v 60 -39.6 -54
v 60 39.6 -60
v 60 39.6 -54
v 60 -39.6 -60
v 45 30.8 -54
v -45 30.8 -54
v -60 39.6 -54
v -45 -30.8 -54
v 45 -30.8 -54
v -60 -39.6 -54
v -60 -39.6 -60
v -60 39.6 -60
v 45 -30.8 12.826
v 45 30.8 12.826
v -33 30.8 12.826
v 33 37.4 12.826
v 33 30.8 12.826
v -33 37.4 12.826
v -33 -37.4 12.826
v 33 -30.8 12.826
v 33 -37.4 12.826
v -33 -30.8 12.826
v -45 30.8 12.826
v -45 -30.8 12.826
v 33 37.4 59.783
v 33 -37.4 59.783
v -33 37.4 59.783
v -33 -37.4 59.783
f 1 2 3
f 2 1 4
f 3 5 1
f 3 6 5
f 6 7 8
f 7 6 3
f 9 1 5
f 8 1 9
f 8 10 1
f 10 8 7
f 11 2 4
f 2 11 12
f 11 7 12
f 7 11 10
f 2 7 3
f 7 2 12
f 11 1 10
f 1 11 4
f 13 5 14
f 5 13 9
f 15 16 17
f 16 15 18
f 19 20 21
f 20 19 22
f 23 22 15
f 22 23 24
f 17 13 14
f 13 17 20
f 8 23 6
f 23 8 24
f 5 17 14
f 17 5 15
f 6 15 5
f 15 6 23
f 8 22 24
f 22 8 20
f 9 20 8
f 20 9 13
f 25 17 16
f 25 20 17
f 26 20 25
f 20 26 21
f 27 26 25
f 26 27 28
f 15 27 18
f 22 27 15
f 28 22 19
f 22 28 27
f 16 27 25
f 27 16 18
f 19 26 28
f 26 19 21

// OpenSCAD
// A mains transformer, 120.0mm x 88.0mm x 120.0mm
// One connected solid (union with intentional overlaps)

overall_width_mm  = 120; //[60:240:1]
overall_depth_mm  = 88;  //[44:176:1]
overall_height_mm = 120; //[60:240:1]

foot_thickness_mm = 6;   //[3:12:1]
foot_width_ratio  = 1;   //[0.85:1.1:0.01]
foot_depth_ratio  = 0.9; //[0.7:1:0.01]

lamination_width_ratio  = 0.75; //[0.55:0.9:0.01]
lamination_depth_ratio  = 0.7;  //[0.5:0.85:0.01]
lamination_height_ratio = 0.65; //[0.45:0.8:0.01]

bobbin_width_ratio  = 0.55; //[0.35:0.75:0.01]
bobbin_depth_ratio  = 0.85; //[0.6:1:0.01]
bobbin_height_ratio = 0.45; //[0.25:0.65:0.01]

connect_overlap_mm = 1; //[0.5:2:0.1]

// Derived dimensions
foot_w = overall_width_mm  * foot_width_ratio;
foot_d = overall_depth_mm  * foot_depth_ratio;
foot_h = foot_thickness_mm;

lam_w = overall_width_mm   * lamination_width_ratio;
lam_d = overall_depth_mm   * lamination_depth_ratio;
lam_h = overall_height_mm  * lamination_height_ratio;

bob_w = overall_width_mm   * bobbin_width_ratio;
bob_d = overall_depth_mm   * bobbin_depth_ratio;
bob_h = overall_height_mm  * bobbin_height_ratio;

// Z placement (bottom of transformer at z = -overall_height_mm/2)
z_bottom = -overall_height_mm/2;

// Ensure the stack fits within overall height by scaling the upper blocks if needed
stack_h = foot_h + lam_h + bob_h;
scale_z = (stack_h > overall_height_mm) ? (overall_height_mm / stack_h) : 1;

lam_h_s = lam_h * scale_z;
bob_h_s = bob_h * scale_z;

// Clamp overlap to avoid inverted placement
ov = min(connect_overlap_mm, min(foot_h, min(lam_h_s, bob_h_s)) * 0.45);

// Component modules
module mounting_foot_plate() {
  translate([0, 0, z_bottom + foot_h/2])
    cube([foot_w, foot_d, foot_h], center=true);
}

module lamination_core_block() {
  // Sits on top of foot with slight overlap into foot
  translate([0, 0, z_bottom + foot_h + lam_h_s/2 - ov])
    cube([lam_w, lam_d, lam_h_s], center=true);
}

module bobbin_coil_block() {
  // Sits on top of lamination with slight overlap into lamination
  translate([0, 0, z_bottom + foot_h + lam_h_s + bob_h_s/2 - ov])
    cube([bob_w, bob_d, bob_h_s], center=true);
}

// Complete transformer assembly (one connected solid)
union() {
  mounting_foot_plate();
  lamination_core_block();
  bobbin_coil_block();
}
